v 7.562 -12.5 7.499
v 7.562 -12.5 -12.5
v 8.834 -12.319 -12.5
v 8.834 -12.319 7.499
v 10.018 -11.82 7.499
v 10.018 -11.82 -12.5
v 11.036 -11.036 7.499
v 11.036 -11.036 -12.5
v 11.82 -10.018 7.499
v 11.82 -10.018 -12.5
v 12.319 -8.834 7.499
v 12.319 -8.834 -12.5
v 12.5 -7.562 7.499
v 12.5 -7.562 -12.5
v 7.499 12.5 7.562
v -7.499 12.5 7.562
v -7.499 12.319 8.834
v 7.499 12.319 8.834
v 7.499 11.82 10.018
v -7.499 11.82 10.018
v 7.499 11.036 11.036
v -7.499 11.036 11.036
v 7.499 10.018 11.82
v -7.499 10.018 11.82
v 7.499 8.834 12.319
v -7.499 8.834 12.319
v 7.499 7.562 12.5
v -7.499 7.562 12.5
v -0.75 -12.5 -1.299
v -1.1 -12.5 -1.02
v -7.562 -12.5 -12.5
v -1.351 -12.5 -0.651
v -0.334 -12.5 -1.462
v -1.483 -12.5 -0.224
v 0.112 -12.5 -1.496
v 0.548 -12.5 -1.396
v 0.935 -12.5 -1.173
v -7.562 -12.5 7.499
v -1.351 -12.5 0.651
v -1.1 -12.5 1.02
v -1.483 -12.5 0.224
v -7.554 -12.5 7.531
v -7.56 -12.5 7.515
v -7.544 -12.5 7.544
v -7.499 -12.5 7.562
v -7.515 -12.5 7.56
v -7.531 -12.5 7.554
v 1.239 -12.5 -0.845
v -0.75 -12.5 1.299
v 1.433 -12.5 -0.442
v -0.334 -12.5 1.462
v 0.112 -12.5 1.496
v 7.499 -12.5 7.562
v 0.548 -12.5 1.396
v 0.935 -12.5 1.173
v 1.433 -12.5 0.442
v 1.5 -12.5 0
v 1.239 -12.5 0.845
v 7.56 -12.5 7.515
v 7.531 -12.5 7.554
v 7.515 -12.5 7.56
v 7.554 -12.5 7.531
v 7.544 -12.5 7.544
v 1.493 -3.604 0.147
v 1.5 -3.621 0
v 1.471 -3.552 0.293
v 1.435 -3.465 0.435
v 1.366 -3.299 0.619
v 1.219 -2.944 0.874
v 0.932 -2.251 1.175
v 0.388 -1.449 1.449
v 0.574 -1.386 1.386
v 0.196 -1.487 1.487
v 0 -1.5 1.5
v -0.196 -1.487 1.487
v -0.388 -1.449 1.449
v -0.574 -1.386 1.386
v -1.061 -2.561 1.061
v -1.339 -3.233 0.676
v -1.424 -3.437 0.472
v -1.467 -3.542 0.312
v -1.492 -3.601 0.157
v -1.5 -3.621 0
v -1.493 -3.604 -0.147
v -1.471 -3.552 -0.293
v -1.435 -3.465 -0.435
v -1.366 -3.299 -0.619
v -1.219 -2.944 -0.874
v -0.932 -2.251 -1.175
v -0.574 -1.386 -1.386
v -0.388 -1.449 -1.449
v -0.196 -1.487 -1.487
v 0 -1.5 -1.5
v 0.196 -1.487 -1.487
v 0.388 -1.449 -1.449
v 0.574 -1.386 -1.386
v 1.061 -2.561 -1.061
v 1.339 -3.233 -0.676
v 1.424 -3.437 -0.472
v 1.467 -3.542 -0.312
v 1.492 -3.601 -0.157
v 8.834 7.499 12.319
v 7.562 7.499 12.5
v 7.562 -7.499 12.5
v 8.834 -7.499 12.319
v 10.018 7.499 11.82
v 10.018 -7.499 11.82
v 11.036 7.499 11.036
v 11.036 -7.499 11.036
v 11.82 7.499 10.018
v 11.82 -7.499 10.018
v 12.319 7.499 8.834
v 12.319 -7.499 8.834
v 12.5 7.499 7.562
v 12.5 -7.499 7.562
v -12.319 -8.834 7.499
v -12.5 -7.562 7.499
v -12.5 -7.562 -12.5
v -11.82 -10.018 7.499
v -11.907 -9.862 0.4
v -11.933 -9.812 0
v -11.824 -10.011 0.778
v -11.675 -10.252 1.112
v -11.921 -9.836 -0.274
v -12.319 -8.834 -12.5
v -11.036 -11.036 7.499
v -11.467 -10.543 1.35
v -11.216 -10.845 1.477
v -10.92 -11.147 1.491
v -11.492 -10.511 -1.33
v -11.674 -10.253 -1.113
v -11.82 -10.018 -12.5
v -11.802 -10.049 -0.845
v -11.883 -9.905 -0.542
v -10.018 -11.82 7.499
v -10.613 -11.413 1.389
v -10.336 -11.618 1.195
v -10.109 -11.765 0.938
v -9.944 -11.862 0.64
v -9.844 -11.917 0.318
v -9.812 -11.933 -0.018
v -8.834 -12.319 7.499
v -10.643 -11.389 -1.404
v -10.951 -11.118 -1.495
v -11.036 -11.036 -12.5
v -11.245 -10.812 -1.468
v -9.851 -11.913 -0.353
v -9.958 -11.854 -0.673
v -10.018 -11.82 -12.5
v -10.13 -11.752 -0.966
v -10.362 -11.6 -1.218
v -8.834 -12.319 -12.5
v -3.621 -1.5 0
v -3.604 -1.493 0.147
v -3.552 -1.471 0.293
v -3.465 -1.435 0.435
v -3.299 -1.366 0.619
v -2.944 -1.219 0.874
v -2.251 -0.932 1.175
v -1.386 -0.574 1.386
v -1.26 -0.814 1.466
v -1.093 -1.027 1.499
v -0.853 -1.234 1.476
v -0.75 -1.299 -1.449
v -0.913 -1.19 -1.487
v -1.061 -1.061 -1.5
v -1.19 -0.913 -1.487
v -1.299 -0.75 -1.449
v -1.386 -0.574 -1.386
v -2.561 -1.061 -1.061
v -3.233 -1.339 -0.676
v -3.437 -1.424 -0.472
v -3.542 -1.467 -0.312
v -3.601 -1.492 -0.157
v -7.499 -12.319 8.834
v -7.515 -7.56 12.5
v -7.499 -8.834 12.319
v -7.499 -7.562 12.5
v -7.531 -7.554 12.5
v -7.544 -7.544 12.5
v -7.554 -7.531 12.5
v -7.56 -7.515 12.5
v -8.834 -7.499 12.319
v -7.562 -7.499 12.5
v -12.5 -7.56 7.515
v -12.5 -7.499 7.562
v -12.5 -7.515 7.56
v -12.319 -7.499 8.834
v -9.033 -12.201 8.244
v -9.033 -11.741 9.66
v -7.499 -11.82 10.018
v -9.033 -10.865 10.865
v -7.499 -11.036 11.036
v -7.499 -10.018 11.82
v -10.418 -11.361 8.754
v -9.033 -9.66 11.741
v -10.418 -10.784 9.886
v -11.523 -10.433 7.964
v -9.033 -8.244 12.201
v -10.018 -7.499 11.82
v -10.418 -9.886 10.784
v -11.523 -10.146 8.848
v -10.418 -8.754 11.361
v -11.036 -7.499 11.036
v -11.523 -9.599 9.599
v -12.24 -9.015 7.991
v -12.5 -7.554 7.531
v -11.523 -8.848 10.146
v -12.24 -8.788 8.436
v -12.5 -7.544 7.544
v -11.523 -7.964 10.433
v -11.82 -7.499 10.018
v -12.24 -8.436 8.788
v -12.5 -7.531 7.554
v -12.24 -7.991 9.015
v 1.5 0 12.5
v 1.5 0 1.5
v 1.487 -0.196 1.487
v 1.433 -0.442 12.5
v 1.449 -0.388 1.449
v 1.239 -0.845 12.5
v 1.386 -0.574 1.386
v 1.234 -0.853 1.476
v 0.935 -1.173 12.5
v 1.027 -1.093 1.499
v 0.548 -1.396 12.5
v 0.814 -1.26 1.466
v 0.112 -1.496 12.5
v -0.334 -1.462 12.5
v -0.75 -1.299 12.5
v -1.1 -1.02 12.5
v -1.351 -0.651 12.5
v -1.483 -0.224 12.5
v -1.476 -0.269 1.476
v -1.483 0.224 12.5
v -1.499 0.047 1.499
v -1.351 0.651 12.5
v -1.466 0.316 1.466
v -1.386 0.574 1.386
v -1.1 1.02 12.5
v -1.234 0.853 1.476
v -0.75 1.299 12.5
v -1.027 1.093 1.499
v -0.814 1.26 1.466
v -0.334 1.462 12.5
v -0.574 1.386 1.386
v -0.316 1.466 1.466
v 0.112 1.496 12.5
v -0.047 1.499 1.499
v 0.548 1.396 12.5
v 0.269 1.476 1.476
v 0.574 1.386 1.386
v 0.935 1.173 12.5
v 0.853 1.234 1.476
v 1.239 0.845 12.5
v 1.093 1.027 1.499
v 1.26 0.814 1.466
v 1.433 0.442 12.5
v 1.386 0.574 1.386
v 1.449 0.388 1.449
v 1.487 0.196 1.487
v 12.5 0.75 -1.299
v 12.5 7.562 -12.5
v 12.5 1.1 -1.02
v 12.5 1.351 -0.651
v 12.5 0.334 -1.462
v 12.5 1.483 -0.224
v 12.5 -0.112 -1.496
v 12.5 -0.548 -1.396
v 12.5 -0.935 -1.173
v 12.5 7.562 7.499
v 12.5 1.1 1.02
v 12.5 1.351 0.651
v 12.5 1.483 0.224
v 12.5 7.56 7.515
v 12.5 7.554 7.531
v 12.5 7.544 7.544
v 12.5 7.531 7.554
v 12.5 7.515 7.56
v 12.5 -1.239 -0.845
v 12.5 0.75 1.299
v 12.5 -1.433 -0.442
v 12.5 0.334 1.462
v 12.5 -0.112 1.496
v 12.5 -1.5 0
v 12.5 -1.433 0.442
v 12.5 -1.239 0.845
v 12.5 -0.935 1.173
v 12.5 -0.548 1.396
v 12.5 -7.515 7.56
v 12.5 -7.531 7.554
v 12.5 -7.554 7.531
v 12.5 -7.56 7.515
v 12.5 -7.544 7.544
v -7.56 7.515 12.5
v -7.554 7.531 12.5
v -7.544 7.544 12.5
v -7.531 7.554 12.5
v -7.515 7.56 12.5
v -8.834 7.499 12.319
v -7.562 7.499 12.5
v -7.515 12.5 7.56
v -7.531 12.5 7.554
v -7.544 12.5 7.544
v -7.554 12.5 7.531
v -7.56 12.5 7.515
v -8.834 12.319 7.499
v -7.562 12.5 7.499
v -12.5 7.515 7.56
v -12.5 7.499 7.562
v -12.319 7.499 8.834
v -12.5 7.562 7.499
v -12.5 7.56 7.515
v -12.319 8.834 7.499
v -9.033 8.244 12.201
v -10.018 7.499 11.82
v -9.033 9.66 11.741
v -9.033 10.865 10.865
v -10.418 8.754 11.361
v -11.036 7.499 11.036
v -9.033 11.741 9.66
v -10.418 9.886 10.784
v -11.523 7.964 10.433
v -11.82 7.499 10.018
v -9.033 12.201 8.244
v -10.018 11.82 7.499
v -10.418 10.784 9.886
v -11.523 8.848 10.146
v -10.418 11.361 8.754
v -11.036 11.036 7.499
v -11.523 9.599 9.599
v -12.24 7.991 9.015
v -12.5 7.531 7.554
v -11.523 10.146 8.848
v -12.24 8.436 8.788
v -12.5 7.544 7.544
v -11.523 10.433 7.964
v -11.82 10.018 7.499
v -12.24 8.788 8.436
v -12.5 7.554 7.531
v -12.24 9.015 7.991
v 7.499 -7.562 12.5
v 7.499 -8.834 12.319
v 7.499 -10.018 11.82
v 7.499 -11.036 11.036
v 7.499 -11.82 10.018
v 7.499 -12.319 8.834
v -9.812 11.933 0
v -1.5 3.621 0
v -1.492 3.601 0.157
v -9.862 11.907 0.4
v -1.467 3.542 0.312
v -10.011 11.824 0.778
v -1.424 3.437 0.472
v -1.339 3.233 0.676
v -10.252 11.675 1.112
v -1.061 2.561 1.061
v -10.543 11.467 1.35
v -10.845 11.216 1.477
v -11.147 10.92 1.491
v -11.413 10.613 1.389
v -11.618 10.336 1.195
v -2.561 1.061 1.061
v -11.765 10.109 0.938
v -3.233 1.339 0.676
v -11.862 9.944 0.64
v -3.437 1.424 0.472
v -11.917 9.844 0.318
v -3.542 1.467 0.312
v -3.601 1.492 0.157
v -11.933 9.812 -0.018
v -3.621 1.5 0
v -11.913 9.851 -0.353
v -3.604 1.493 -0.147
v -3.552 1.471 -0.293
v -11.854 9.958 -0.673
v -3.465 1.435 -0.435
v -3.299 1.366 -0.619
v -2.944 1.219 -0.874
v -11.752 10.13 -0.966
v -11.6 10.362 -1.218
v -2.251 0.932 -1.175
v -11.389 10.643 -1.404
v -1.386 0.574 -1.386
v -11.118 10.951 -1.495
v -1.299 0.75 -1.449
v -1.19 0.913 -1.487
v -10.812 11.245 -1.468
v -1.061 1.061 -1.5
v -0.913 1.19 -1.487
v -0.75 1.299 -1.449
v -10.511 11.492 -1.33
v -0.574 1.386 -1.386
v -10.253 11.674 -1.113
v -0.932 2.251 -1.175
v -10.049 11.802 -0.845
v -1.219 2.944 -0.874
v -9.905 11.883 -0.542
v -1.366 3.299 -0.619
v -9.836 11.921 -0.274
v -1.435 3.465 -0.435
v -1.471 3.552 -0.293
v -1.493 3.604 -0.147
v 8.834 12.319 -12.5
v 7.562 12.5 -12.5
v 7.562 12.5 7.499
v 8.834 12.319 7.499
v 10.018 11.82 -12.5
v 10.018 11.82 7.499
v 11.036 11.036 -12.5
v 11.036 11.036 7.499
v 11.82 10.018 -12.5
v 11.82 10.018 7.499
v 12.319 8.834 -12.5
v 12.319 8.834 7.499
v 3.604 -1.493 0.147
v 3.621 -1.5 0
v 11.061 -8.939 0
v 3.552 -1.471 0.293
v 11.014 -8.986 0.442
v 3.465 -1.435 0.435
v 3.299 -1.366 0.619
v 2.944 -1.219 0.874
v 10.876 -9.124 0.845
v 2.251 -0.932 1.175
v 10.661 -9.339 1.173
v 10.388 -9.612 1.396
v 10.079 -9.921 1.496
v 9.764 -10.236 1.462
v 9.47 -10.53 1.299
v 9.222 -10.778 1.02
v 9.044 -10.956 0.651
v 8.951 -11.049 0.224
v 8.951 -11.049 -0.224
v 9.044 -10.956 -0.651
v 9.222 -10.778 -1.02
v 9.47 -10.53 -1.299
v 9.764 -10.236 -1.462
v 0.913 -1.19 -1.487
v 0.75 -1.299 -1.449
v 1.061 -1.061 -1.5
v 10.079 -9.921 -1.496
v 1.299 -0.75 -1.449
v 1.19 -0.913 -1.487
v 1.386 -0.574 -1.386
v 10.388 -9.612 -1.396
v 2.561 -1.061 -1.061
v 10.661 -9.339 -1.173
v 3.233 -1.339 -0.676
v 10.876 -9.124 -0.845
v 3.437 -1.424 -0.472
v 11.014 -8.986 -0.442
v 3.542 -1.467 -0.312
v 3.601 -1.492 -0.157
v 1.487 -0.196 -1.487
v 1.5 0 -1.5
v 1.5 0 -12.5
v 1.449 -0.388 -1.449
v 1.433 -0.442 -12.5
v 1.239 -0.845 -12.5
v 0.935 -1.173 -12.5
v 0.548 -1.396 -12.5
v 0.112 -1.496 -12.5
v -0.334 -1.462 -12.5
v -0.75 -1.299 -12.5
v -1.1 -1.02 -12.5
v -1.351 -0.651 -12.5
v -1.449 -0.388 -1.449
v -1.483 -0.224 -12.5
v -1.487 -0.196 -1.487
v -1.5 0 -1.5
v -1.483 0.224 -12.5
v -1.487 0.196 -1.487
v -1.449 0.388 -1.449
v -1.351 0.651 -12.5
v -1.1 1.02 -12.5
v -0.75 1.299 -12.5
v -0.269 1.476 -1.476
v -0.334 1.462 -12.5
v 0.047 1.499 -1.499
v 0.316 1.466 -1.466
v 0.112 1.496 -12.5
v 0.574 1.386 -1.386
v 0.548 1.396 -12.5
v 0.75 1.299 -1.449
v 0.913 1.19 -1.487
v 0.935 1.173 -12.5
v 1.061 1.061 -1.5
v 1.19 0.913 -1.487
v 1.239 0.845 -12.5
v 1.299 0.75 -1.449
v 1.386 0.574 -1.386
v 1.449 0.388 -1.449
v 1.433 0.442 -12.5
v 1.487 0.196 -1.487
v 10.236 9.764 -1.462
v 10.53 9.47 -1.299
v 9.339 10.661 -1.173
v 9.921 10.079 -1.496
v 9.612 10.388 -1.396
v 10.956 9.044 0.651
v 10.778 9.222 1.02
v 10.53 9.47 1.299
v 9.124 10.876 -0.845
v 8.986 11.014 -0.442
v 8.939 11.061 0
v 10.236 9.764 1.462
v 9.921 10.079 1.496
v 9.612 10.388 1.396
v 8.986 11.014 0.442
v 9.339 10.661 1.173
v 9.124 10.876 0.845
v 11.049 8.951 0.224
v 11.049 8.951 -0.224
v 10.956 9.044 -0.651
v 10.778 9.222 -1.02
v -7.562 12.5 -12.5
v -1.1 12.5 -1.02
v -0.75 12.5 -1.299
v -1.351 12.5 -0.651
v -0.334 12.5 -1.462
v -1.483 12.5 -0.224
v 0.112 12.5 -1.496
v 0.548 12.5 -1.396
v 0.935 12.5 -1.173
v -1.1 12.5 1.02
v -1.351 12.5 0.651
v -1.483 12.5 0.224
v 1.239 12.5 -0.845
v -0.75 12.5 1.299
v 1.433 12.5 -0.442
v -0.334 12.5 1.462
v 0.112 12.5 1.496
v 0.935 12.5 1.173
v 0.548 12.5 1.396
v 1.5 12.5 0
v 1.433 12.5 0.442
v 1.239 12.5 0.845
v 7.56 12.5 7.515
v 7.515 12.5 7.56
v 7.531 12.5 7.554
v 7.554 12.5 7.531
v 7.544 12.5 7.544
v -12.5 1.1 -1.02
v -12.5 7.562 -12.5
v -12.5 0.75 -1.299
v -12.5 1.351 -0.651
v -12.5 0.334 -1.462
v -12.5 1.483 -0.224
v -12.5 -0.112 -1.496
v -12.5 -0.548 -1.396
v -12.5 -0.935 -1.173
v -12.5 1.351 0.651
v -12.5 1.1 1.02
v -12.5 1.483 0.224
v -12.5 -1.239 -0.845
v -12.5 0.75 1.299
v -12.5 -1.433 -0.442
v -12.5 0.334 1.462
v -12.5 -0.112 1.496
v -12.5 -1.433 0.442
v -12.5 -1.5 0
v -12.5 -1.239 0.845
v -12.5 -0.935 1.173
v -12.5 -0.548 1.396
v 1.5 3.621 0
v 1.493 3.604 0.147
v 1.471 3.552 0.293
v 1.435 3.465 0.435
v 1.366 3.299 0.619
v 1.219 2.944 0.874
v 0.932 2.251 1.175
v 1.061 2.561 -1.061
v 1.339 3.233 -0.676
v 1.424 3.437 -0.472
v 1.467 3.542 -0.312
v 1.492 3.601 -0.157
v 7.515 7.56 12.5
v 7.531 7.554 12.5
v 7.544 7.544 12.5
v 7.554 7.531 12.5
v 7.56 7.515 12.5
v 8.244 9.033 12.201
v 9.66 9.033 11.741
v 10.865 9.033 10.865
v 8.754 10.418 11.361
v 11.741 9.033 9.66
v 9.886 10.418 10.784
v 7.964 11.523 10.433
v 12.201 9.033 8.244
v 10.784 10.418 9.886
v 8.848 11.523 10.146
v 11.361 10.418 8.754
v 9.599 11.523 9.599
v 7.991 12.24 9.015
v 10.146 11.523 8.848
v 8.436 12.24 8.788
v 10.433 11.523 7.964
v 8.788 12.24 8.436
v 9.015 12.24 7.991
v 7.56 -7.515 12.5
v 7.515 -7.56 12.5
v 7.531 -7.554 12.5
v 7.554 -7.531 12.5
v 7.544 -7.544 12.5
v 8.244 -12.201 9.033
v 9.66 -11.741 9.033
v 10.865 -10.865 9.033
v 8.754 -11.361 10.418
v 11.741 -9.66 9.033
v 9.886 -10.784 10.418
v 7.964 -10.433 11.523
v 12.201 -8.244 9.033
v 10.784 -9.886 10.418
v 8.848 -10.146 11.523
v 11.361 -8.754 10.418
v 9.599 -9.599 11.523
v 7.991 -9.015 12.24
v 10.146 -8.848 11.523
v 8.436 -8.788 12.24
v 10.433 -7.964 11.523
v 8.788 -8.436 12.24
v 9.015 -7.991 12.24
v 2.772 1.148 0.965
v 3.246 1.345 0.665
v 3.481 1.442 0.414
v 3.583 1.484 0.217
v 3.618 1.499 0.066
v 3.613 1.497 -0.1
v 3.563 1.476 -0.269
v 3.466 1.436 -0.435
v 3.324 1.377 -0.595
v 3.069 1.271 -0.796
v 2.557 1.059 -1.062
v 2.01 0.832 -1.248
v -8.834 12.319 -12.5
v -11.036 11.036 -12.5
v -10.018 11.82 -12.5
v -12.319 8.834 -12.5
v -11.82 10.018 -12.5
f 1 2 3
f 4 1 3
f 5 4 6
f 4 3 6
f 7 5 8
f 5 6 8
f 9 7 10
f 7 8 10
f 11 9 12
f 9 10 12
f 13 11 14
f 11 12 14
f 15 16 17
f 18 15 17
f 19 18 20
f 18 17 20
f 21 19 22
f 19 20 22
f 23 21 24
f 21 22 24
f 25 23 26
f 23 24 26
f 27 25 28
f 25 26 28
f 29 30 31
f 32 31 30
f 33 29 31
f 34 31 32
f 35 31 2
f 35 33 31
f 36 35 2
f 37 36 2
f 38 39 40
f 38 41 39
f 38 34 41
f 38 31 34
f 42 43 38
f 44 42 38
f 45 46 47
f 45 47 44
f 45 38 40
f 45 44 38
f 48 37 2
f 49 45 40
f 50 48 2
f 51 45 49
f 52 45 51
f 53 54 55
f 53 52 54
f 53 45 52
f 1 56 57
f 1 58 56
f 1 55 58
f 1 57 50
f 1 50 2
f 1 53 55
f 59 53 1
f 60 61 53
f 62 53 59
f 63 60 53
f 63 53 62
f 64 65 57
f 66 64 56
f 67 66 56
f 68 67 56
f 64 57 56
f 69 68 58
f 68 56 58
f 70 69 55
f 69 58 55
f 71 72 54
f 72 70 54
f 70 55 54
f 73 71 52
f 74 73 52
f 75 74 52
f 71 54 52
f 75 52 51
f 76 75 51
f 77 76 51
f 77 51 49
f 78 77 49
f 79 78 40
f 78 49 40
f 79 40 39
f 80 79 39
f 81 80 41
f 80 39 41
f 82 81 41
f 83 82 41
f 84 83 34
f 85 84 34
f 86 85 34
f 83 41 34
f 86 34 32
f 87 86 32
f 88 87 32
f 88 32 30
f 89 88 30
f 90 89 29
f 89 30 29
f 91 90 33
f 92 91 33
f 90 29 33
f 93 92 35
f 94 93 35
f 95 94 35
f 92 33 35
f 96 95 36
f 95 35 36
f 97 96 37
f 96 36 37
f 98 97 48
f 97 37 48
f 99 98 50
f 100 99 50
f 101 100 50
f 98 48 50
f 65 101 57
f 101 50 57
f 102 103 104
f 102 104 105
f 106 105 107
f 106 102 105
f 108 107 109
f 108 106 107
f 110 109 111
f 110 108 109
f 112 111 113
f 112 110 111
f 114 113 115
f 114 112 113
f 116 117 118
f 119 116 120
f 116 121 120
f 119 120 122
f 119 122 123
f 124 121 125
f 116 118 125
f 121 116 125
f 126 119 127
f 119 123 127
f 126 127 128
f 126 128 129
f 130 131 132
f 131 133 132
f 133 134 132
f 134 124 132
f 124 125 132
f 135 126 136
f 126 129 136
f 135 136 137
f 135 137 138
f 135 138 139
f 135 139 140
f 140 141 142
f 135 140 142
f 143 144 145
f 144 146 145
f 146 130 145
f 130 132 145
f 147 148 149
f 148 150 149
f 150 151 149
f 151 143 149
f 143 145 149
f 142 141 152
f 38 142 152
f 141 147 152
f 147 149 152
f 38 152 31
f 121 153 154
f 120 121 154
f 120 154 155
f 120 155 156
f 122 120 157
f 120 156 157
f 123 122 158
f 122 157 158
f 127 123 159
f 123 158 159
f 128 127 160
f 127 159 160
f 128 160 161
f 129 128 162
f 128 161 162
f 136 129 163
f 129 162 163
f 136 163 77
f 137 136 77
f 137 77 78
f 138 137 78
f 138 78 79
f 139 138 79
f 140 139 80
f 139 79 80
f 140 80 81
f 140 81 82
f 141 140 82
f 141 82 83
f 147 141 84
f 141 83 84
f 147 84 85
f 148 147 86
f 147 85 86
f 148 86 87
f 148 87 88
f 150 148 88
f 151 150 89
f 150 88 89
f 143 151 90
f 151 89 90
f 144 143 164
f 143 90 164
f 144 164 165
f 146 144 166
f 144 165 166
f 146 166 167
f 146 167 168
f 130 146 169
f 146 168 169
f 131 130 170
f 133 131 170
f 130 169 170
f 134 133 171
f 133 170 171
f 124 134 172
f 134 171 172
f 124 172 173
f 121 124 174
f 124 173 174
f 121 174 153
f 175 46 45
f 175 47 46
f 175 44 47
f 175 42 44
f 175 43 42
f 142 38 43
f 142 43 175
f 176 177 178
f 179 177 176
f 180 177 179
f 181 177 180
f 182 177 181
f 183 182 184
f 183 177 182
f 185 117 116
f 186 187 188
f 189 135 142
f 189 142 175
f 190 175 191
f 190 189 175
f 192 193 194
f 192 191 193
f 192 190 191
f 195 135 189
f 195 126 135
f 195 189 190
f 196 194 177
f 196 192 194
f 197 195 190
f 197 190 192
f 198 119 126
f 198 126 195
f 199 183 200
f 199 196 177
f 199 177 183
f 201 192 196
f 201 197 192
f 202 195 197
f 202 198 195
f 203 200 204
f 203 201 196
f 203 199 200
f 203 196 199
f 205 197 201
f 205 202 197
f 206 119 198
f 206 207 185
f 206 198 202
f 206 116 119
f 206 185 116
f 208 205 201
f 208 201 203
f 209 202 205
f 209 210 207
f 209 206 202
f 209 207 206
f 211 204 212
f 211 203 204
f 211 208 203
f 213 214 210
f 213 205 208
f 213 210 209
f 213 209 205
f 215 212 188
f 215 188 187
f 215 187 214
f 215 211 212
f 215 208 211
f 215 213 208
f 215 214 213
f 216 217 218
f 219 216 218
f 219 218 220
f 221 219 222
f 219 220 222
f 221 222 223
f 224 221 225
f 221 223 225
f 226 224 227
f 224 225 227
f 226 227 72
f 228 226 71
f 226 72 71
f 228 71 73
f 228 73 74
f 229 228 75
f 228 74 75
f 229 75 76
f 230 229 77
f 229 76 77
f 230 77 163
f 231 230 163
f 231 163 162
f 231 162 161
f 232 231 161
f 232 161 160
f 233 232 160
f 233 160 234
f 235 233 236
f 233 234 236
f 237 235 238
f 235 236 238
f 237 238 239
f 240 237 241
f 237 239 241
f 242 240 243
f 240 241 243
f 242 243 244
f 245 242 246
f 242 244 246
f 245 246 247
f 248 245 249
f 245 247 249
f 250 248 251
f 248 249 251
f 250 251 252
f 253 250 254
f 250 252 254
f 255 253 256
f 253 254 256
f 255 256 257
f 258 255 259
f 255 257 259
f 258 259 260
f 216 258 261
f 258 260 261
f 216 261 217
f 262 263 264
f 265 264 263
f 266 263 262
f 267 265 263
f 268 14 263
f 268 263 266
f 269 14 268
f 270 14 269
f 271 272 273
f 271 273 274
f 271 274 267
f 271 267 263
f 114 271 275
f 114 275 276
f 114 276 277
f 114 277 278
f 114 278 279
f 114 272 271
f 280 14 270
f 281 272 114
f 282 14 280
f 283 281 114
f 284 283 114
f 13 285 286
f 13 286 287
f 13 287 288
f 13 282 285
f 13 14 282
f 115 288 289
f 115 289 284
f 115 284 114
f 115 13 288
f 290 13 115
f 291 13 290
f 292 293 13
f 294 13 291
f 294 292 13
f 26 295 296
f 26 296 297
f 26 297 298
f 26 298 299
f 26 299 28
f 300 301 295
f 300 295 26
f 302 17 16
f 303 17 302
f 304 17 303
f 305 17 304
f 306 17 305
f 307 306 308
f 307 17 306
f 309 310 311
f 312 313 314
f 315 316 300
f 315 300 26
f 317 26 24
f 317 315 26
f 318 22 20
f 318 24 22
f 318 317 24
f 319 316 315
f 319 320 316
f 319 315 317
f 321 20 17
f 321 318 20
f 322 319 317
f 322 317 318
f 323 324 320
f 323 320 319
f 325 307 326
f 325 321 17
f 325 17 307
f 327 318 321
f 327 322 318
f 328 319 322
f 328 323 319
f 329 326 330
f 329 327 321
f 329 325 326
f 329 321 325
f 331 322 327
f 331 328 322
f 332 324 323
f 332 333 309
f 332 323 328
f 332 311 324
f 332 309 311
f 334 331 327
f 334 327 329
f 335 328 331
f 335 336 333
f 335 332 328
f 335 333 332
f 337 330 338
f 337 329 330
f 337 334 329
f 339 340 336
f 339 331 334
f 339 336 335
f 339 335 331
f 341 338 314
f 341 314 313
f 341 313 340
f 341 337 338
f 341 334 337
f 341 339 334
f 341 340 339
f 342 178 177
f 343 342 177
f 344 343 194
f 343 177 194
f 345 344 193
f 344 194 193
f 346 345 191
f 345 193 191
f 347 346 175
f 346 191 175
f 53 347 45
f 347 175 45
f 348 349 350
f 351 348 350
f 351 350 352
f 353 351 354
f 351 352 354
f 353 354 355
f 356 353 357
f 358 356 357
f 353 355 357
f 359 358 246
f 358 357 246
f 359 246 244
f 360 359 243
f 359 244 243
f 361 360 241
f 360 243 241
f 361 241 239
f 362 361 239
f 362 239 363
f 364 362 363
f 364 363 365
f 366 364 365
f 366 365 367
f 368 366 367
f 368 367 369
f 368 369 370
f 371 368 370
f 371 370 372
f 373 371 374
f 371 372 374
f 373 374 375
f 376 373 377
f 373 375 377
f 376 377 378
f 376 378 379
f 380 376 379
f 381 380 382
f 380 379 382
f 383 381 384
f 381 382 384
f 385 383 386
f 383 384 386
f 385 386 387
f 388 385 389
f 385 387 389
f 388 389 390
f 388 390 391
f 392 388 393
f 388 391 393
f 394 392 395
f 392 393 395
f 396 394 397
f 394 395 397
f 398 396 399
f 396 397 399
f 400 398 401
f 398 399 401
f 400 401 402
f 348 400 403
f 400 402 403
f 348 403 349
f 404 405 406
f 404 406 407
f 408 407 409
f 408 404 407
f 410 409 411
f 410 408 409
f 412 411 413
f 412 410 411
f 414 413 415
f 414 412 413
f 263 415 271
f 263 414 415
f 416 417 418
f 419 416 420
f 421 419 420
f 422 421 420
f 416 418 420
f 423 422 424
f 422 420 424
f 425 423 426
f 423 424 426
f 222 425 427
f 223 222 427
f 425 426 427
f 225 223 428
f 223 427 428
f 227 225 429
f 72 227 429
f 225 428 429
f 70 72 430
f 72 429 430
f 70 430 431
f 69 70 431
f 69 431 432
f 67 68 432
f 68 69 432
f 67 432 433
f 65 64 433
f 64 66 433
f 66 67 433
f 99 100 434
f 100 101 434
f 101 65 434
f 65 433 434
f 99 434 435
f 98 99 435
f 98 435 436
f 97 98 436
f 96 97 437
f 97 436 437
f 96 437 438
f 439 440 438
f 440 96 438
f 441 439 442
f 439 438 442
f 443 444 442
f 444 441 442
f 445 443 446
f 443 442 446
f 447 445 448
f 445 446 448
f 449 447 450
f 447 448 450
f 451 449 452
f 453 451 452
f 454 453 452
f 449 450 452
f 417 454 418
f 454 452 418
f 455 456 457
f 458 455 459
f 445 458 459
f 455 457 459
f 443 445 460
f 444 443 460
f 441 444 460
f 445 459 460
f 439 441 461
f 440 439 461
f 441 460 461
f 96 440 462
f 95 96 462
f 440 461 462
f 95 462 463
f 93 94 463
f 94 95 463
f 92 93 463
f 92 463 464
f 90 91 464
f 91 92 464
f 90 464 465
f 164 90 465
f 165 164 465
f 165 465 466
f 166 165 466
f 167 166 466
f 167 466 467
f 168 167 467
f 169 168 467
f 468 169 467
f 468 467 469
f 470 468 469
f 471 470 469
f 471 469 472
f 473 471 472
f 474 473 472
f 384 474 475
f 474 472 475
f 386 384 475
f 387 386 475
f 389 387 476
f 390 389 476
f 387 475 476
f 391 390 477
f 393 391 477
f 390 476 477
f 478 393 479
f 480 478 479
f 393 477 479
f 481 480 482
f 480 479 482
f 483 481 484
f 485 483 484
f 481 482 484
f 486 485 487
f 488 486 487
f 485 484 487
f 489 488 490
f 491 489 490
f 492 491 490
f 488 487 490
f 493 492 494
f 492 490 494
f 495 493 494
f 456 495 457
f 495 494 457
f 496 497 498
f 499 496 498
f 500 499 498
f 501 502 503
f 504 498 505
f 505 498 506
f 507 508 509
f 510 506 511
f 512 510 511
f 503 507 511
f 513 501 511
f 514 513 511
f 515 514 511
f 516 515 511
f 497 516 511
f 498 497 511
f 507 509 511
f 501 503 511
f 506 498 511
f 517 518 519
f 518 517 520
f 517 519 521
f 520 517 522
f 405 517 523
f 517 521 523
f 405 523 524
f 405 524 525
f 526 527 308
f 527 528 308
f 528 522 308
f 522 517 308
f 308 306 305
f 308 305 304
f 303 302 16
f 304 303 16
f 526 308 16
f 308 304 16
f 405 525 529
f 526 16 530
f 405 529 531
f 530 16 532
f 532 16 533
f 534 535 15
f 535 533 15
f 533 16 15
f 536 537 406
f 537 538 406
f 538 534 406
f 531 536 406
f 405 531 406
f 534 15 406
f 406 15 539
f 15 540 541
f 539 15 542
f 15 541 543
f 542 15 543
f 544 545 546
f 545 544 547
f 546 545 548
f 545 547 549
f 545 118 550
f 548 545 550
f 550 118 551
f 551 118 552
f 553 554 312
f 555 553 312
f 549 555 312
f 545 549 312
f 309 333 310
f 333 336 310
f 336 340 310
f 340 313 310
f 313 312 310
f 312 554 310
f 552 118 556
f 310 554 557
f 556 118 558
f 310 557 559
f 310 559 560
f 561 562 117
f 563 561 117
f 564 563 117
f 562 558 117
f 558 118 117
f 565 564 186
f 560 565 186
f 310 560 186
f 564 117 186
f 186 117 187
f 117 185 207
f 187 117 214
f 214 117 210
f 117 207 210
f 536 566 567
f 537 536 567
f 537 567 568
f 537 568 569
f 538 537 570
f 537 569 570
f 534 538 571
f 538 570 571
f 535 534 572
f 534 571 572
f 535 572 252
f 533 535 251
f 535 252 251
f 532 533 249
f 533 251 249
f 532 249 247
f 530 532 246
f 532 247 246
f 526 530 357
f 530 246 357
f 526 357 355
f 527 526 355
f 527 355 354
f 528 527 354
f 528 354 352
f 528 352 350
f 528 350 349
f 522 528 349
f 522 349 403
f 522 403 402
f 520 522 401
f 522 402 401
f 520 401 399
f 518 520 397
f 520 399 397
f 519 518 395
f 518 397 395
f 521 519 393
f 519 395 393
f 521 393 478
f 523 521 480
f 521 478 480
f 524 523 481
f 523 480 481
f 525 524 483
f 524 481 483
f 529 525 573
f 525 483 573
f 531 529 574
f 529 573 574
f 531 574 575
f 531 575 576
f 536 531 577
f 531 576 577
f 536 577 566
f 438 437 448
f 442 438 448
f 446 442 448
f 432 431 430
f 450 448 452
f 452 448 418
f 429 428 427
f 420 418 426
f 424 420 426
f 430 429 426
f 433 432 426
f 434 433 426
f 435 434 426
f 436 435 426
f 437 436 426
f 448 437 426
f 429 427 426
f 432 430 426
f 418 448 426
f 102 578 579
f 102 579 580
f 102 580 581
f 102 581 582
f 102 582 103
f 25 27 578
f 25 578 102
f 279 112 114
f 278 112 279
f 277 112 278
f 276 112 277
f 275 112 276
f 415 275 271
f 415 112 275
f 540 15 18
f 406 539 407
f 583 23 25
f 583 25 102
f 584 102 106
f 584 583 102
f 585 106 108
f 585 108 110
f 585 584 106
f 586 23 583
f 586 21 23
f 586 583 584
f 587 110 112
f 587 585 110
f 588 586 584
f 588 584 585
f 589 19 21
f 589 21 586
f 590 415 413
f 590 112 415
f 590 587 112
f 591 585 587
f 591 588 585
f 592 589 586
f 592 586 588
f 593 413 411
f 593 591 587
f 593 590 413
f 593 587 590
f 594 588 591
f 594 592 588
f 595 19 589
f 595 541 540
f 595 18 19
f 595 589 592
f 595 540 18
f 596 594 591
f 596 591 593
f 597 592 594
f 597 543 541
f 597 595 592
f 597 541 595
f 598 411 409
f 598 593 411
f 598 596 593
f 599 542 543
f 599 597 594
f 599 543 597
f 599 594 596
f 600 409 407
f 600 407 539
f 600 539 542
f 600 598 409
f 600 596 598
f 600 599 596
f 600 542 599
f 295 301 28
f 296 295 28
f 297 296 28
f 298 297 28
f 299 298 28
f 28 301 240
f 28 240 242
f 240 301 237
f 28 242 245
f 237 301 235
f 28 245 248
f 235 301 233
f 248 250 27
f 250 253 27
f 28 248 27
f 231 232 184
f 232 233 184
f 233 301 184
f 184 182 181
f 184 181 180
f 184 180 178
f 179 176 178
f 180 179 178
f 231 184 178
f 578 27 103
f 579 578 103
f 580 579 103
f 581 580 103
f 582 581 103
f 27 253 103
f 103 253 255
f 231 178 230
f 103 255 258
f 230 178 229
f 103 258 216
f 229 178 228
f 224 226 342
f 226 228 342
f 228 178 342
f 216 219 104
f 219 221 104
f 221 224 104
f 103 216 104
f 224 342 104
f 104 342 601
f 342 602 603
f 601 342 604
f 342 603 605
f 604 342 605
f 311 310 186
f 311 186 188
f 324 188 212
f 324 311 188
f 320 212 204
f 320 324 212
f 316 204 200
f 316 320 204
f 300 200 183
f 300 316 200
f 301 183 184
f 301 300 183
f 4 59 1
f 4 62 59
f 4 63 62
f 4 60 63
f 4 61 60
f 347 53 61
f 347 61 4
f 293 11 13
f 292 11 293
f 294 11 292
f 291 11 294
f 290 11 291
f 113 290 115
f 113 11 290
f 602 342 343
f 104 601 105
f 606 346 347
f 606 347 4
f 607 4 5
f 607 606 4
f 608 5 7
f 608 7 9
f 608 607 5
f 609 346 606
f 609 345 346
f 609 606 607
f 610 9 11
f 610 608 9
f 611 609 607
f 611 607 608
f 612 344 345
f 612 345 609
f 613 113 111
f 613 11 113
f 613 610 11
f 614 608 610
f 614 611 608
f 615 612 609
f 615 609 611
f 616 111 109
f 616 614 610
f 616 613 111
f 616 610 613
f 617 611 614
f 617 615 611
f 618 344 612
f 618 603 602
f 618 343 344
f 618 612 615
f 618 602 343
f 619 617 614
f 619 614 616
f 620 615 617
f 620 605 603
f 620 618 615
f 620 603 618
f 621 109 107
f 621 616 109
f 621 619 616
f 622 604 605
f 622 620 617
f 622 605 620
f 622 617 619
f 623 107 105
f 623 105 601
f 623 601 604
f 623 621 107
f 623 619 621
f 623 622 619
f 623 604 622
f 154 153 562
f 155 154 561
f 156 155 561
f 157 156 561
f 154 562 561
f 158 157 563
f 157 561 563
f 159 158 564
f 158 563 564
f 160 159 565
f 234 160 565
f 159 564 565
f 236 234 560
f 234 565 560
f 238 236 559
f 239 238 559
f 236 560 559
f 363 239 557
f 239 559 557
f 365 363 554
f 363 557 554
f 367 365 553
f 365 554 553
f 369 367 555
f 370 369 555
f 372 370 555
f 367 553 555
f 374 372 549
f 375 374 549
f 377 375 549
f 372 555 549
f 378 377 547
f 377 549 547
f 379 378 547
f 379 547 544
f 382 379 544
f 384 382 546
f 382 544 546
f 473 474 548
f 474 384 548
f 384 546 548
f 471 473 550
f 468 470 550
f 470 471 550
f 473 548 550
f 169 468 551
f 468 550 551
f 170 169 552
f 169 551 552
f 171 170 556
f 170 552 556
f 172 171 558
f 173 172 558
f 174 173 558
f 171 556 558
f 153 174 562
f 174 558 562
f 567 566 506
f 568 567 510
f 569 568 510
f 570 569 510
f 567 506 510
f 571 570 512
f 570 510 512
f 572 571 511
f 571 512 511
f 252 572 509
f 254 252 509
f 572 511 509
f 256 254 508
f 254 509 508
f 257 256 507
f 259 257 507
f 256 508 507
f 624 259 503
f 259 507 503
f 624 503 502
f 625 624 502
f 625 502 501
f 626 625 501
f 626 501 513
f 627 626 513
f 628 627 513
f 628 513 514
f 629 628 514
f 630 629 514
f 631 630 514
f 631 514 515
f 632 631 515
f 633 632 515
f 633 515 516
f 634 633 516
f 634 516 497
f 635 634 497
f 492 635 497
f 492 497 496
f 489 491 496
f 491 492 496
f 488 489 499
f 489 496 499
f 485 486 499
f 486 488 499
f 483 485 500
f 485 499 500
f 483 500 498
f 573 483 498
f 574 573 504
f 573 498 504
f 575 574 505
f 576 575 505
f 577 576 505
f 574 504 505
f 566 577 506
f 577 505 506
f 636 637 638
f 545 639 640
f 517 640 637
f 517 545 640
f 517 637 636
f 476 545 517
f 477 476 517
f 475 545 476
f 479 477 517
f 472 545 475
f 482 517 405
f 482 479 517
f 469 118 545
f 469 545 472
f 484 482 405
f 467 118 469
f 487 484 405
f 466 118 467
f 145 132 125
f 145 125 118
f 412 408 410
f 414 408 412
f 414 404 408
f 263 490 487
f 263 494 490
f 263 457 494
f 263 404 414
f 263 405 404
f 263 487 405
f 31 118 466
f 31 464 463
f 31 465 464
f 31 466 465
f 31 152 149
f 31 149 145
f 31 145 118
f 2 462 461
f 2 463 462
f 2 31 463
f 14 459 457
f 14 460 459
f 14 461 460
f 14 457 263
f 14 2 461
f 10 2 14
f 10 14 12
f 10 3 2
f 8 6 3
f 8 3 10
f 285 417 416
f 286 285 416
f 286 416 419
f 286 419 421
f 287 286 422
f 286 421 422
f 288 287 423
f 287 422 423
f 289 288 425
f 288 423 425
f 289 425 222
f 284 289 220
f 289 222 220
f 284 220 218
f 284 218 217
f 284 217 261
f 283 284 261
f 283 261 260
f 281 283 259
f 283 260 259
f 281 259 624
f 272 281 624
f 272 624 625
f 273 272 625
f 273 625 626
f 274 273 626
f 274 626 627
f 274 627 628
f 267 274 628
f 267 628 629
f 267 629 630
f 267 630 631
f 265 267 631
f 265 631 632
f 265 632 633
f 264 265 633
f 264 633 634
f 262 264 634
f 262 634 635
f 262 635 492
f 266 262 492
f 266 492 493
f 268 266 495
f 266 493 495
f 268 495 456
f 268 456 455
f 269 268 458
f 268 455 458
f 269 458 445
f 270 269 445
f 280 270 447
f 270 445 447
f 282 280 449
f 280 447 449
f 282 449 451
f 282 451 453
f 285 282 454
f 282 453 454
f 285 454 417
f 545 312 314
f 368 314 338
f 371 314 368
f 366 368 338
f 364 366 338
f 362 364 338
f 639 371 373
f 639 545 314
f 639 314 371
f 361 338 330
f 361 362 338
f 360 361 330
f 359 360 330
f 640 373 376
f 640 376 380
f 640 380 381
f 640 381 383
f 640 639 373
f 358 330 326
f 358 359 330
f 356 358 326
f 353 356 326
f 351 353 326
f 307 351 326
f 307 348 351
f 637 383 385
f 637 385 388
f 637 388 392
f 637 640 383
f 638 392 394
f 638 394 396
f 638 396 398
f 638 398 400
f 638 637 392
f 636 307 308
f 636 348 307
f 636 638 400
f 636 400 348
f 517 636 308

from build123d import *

# Parameters (mm, degrees)
F0_W         = 25
F0_H         = 25
F1_DEPTH     = 12.5
F2_R         = 1.5
F3_DEPTH     = 25
F4_R         = 1.5
F5_DEPTH     = 25.001
F6_R         = 1.5
F7_DEPTH     = 25.001
F8_T1_DEPTH  = 32.5014485681
F8_T3_DEPTH  = 14.9980686292
F8_T5_DEPTH  = 14.9980686292
F8_S9_W      = 5.5015022539
F8_S9_H      = 5.5015022539
F8_T10_DEPTH = 5.501502254
F8_S15_W     = 5.5015022539
F8_S15_H     = 5.5015022539
F8_T16_DEPTH = 5.501502254
F8_S21_W     = 5.5015022539
F8_S21_H     = 5.5015022539
F8_T22_DEPTH = 5.501502254
F8_S27_W     = 5.5015022539
F8_S27_H     = 5.5015022539
F8_T28_DEPTH = 5.501502254
F10_R        = 1.5
F11_DEPTH    = 31.8208051534
F13_R        = 1.5
F14_DEPTH    = 31.8208052241


# Not quite as in the source:
# - a fillet or chamfer that OpenCascade refuses, or shapes differently, is made with other operations: its cross-section is extruded or revolved along the edge and cut away or added


with BuildPart() as f1:
    # F0 (on Front) → F1 (new body, symmetric)
    with BuildSketch(Plane.XZ):
        Rectangle(F0_W, F0_H)
    extrude(amount=F1_DEPTH, both=True)

    # F2 (on face) → F3 (cut, through all)
    with BuildSketch(Plane.XZ.offset(12.5)):
        Circle(F2_R)
    extrude(amount=-F3_DEPTH, mode=Mode.SUBTRACT)

    # F4 (on face) → F5 (cut, through all)
    with BuildSketch(Plane(origin=(0, 0, -12.5), x_dir=(1, 0, 0), z_dir=(0, 0, -1))):
        Circle(F4_R)
    extrude(amount=-F5_DEPTH, mode=Mode.SUBTRACT)

    # F6 (on face) → F7 (cut, through all)
    with BuildSketch(Plane(origin=(-12.5, 0, 0), x_dir=(0, -1, 0), z_dir=(-1, 0, 0))):
        Circle(F6_R)
    extrude(amount=-F7_DEPTH, mode=Mode.SUBTRACT)

    # F8: fillet of radius 5 on 8 edges, made by hand

    # F8_s2 → F8_t1 (cut)
    with BuildSketch(Plane.XY.offset(-25.0024142536)):
        with BuildLine():
            ThreePointArc((7.4990343146, -12.5004), (11.0355339059, -11.0355339059), (12.5004, -7.4990343146))
            Line((12.5004, -7.4990343146), (13.0005365685, -7.4990343146))
            ThreePointArc((13.0005365685, -7.4990343146), (13.0001365685, -9.9995171573), (13.0001365685, -12.5))
            Line((13.0001365685, -12.5), (12.5, -13.0001365685))
            ThreePointArc((12.5, -13.0001365685), (9.9995171573, -13.0001365685), (7.4990343146, -13.0005365685))
            Line((7.4990343146, -13.0005365685), (7.4990343146, -12.5004))
        make_face()
        with BuildLine():
            ThreePointArc((-12.5004, 7.4990343146), (-11.0355339059, 11.0355339059), (-7.4990343146, 12.5004))
            Line((-7.4990343146, 12.5004), (-7.4990343146, 13.0005365685))
            ThreePointArc((-7.4990343146, 13.0005365685), (-9.9995171573, 13.0001365685), (-12.5, 13.0001365685))
            Line((-12.5, 13.0001365685), (-13.0001365685, 12.5))
            ThreePointArc((-13.0001365685, 12.5), (-13.0001365685, 9.9995171573), (-13.0005365685, 7.4990343146))
            Line((-13.0005365685, 7.4990343146), (-12.5004, 7.4990343146))
        make_face()
        with BuildLine():
            ThreePointArc((-12.5004, -7.4990343146), (-11.0355339059, -11.0355339059), (-7.4990343146, -12.5004))
            Line((-7.4990343146, -12.5004), (-7.4990343146, -13.0005365685))
            ThreePointArc((-7.4990343146, -13.0005365685), (-9.9995171573, -13.0001365685), (-12.5, -13.0001365685))
            Line((-12.5, -13.0001365685), (-13.0001365685, -12.5))
            ThreePointArc((-13.0001365685, -12.5), (-13.0001365685, -9.9995171573), (-13.0005365685, -7.4990343146))
            Line((-13.0005365685, -7.4990343146), (-12.5004, -7.4990343146))
        make_face()
        with BuildLine():
            ThreePointArc((7.4990343146, 12.5004), (11.0355339059, 11.0355339059), (12.5004, 7.4990343146))
            Line((12.5004, 7.4990343146), (13.0005365685, 7.4990343146))
            ThreePointArc((13.0005365685, 7.4990343146), (13.0001365685, 9.9995171573), (13.0001365685, 12.5))
            Line((13.0001365685, 12.5), (12.5, 13.0001365685))
            ThreePointArc((12.5, 13.0001365685), (9.9995171573, 13.0001365685), (7.4990343146, 13.0005365685))
            Line((7.4990343146, 13.0005365685), (7.4990343146, 12.5004))
        make_face()
    extrude(amount=F8_T1_DEPTH, mode=Mode.SUBTRACT)

    # F8_s4 → F8_t3 (cut)
    with BuildSketch(Plane.XZ.offset(-7.4990343146)):
        with BuildLine():
            ThreePointArc((7.4990343146, 12.5004), (11.0355339059, 11.0355339059), (12.5004, 7.4990343146))
            Line((12.5004, 7.4990343146), (13.0005365685, 7.4990343146))
            ThreePointArc((13.0005365685, 7.4990343146), (13.0001365685, 9.9995171573), (13.0001365685, 12.5))
            Line((13.0001365685, 12.5), (12.5, 13.0001365685))
            ThreePointArc((12.5, 13.0001365685), (9.9995171573, 13.0001365685), (7.4990343146, 13.0005365685))
            Line((7.4990343146, 13.0005365685), (7.4990343146, 12.5004))
        make_face()
        with BuildLine():
            ThreePointArc((-12.5004, 7.4990343146), (-11.0355339059, 11.0355339059), (-7.4990343146, 12.5004))
            Line((-7.4990343146, 12.5004), (-7.4990343146, 13.0005365685))
            ThreePointArc((-7.4990343146, 13.0005365685), (-9.9995171573, 13.0001365685), (-12.5, 13.0001365685))
            Line((-12.5, 13.0001365685), (-13.0001365685, 12.5))
            ThreePointArc((-13.0001365685, 12.5), (-13.0001365685, 9.9995171573), (-13.0005365685, 7.4990343146))
            Line((-13.0005365685, 7.4990343146), (-12.5004, 7.4990343146))
        make_face()
    extrude(amount=F8_T3_DEPTH, mode=Mode.SUBTRACT)

    # F8_s6 → F8_t5 (cut)
    with BuildSketch(Plane.YZ.offset(-7.4990343146)):
        with BuildLine():
            ThreePointArc((12.5004, 7.4990343146), (11.0355339059, 11.0355339059), (7.4990343146, 12.5004))
            Line((7.4990343146, 12.5004), (7.4990343146, 13.0005365685))
            ThreePointArc((7.4990343146, 13.0005365685), (9.9995171573, 13.0001365685), (12.5, 13.0001365685))
            Line((12.5, 13.0001365685), (13.0001365685, 12.5))
            ThreePointArc((13.0001365685, 12.5), (13.0001365685, 9.9995171573), (13.0005365685, 7.4990343146))
            Line((13.0005365685, 7.4990343146), (12.5004, 7.4990343146))
        make_face()
        with BuildLine():
            ThreePointArc((-7.4990343146, 12.5004), (-11.0355339059, 11.0355339059), (-12.5004, 7.4990343146))
            Line((-12.5004, 7.4990343146), (-13.0005365685, 7.4990343146))
            ThreePointArc((-13.0005365685, 7.4990343146), (-13.0001365685, 9.9995171573), (-13.0001365685, 12.5))
            Line((-13.0001365685, 12.5), (-12.5, 13.0001365685))
            ThreePointArc((-12.5, 13.0001365685), (-9.9995171573, 13.0001365685), (-7.4990343146, 13.0005365685))
            Line((-7.4990343146, 13.0005365685), (-7.4990343146, 12.5004))
        make_face()
    extrude(amount=F8_T5_DEPTH, mode=Mode.SUBTRACT)


with BuildPart() as f8_tool8:
    # F8_s9 → F8_t10 (new body)
    with BuildSketch(Plane.XY.offset(7.4990343146)):
        with Locations((10.2497854415, -10.2497854415)):
            Rectangle(F8_S9_W, F8_S9_H)
    extrude(amount=F8_T10_DEPTH)

    # F8_s11 → F8_t12 (revolve, cut)
    with BuildSketch(Plane(origin=(7.4990343146, -7.4990343146, 7.4990343146), x_dir=(-0.7071067812, 0.7071067812, 0), z_dir=(0.7071067812, 0.7071067812, 0))):
        with BuildLine():
            ThreePointArc((0, -5.0013656854), (5.0013656854, 0), (0, 5.0013656854))
            Line((0, 5.0013656854), (0, -5.0013656854))
        make_face()
    revolve(axis=Axis((7.4990343146, -7.4990343146, 7.4990343146), (0, 0, 1)), mode=Mode.SUBTRACT)


with BuildPart() as f1_1:
    add(f1.part)

    # F8_t7: cut F8_tool8
    add(f8_tool8.part, mode=Mode.SUBTRACT)


with BuildPart() as f8_tool14:
    # F8_s15 → F8_t16 (new body)
    with BuildSketch(Plane.XZ.offset(-7.4990343146)):
        with Locations((10.2497854415, 10.2497854415)):
            Rectangle(F8_S15_W, F8_S15_H)
    extrude(amount=-F8_T16_DEPTH)

    # F8_s17 → F8_t18 (revolve, cut)
    with BuildSketch(Plane(origin=(7.4990343146, 7.4990343146, 7.4990343146), x_dir=(-0.7071067812, 0, -0.7071067812), z_dir=(0.7071067812, 0, -0.7071067812))):
        with BuildLine():
            ThreePointArc((0, -5.0013656854), (5.0013656854, 0), (0, 5.0013656854))
            Line((0, 5.0013656854), (0, -5.0013656854))
        make_face()
    revolve(axis=Axis((7.4990343146, 7.4990343146, 7.4990343146), (0, 1, 0)), mode=Mode.SUBTRACT)


with BuildPart() as f1_2:
    add(f1_1.part)

    # F8_t13: cut F8_tool14
    add(f8_tool14.part, mode=Mode.SUBTRACT)


with BuildPart() as f8_tool20:
    # F8_s21 → F8_t22 (new body)
    with BuildSketch(Plane.YZ.offset(-7.4990343146)):
        with Locations((10.2497854415, 10.2497854415)):
            Rectangle(F8_S21_W, F8_S21_H)
    extrude(amount=-F8_T22_DEPTH)

    # F8_s23 → F8_t24 (revolve, cut)
    with BuildSketch(Plane(origin=(-7.4990343146, 7.4990343146, 7.4990343146), x_dir=(0, -0.7071067812, -0.7071067812), z_dir=(0, 0.7071067812, -0.7071067812))):
        with BuildLine():
            ThreePointArc((0, -5.0013656854), (5.0013656854, 0), (0, 5.0013656854))
            Line((0, 5.0013656854), (0, -5.0013656854))
        make_face()
    revolve(axis=Axis((-7.4990343146, 7.4990343146, 7.4990343146), (-1, 0, 0)), mode=Mode.SUBTRACT)


with BuildPart() as f1_3:
    add(f1_2.part)

    # F8_t19: cut F8_tool20
    add(f8_tool20.part, mode=Mode.SUBTRACT)


with BuildPart() as f8_tool26:
    # F8_s27 → F8_t28 (new body)
    with BuildSketch(Plane.YZ.offset(-7.4990343146)):
        with Locations((-10.2497854415, 10.2497854415)):
            Rectangle(F8_S27_W, F8_S27_H)
    extrude(amount=-F8_T28_DEPTH)

    # F8_s29 → F8_t30 (revolve, cut)
    with BuildSketch(Plane(origin=(-7.4990343146, -7.4990343146, 7.4990343146), x_dir=(0, 0.7071067812, -0.7071067812), z_dir=(0, 0.7071067812, 0.7071067812))):
        with BuildLine():
            ThreePointArc((0, -5.0013656854), (5.0013656854, 0), (0, 5.0013656854))
            Line((0, 5.0013656854), (0, -5.0013656854))
        make_face()
    revolve(axis=Axis((-7.4990343146, -7.4990343146, 7.4990343146), (-1, 0, 0)), mode=Mode.SUBTRACT)


with BuildPart() as f1_4:
    add(f1_3.part)

    # F8_t25: cut F8_tool26
    add(f8_tool26.part, mode=Mode.SUBTRACT)

    # F10 (on face) → F11 (cut, through all)
    with BuildSketch(Plane(origin=(10, 10, 0), x_dir=(-0.7071067812, 0.7071067812, 0), z_dir=(0.7071067812, 0.7071067812, 0))):
        Circle(F10_R)
    extrude(amount=-F11_DEPTH, mode=Mode.SUBTRACT)

    # F13 (on face) → F14 (cut, through all)
    with BuildSketch(Plane(origin=(10, -10, 0), x_dir=(0.7071067812, 0.7071067812, 0), z_dir=(0.7071067812, -0.7071067812, 0))):
        Circle(F13_R)
    extrude(amount=-F14_DEPTH, mode=Mode.SUBTRACT)


solid = f1_4.part
